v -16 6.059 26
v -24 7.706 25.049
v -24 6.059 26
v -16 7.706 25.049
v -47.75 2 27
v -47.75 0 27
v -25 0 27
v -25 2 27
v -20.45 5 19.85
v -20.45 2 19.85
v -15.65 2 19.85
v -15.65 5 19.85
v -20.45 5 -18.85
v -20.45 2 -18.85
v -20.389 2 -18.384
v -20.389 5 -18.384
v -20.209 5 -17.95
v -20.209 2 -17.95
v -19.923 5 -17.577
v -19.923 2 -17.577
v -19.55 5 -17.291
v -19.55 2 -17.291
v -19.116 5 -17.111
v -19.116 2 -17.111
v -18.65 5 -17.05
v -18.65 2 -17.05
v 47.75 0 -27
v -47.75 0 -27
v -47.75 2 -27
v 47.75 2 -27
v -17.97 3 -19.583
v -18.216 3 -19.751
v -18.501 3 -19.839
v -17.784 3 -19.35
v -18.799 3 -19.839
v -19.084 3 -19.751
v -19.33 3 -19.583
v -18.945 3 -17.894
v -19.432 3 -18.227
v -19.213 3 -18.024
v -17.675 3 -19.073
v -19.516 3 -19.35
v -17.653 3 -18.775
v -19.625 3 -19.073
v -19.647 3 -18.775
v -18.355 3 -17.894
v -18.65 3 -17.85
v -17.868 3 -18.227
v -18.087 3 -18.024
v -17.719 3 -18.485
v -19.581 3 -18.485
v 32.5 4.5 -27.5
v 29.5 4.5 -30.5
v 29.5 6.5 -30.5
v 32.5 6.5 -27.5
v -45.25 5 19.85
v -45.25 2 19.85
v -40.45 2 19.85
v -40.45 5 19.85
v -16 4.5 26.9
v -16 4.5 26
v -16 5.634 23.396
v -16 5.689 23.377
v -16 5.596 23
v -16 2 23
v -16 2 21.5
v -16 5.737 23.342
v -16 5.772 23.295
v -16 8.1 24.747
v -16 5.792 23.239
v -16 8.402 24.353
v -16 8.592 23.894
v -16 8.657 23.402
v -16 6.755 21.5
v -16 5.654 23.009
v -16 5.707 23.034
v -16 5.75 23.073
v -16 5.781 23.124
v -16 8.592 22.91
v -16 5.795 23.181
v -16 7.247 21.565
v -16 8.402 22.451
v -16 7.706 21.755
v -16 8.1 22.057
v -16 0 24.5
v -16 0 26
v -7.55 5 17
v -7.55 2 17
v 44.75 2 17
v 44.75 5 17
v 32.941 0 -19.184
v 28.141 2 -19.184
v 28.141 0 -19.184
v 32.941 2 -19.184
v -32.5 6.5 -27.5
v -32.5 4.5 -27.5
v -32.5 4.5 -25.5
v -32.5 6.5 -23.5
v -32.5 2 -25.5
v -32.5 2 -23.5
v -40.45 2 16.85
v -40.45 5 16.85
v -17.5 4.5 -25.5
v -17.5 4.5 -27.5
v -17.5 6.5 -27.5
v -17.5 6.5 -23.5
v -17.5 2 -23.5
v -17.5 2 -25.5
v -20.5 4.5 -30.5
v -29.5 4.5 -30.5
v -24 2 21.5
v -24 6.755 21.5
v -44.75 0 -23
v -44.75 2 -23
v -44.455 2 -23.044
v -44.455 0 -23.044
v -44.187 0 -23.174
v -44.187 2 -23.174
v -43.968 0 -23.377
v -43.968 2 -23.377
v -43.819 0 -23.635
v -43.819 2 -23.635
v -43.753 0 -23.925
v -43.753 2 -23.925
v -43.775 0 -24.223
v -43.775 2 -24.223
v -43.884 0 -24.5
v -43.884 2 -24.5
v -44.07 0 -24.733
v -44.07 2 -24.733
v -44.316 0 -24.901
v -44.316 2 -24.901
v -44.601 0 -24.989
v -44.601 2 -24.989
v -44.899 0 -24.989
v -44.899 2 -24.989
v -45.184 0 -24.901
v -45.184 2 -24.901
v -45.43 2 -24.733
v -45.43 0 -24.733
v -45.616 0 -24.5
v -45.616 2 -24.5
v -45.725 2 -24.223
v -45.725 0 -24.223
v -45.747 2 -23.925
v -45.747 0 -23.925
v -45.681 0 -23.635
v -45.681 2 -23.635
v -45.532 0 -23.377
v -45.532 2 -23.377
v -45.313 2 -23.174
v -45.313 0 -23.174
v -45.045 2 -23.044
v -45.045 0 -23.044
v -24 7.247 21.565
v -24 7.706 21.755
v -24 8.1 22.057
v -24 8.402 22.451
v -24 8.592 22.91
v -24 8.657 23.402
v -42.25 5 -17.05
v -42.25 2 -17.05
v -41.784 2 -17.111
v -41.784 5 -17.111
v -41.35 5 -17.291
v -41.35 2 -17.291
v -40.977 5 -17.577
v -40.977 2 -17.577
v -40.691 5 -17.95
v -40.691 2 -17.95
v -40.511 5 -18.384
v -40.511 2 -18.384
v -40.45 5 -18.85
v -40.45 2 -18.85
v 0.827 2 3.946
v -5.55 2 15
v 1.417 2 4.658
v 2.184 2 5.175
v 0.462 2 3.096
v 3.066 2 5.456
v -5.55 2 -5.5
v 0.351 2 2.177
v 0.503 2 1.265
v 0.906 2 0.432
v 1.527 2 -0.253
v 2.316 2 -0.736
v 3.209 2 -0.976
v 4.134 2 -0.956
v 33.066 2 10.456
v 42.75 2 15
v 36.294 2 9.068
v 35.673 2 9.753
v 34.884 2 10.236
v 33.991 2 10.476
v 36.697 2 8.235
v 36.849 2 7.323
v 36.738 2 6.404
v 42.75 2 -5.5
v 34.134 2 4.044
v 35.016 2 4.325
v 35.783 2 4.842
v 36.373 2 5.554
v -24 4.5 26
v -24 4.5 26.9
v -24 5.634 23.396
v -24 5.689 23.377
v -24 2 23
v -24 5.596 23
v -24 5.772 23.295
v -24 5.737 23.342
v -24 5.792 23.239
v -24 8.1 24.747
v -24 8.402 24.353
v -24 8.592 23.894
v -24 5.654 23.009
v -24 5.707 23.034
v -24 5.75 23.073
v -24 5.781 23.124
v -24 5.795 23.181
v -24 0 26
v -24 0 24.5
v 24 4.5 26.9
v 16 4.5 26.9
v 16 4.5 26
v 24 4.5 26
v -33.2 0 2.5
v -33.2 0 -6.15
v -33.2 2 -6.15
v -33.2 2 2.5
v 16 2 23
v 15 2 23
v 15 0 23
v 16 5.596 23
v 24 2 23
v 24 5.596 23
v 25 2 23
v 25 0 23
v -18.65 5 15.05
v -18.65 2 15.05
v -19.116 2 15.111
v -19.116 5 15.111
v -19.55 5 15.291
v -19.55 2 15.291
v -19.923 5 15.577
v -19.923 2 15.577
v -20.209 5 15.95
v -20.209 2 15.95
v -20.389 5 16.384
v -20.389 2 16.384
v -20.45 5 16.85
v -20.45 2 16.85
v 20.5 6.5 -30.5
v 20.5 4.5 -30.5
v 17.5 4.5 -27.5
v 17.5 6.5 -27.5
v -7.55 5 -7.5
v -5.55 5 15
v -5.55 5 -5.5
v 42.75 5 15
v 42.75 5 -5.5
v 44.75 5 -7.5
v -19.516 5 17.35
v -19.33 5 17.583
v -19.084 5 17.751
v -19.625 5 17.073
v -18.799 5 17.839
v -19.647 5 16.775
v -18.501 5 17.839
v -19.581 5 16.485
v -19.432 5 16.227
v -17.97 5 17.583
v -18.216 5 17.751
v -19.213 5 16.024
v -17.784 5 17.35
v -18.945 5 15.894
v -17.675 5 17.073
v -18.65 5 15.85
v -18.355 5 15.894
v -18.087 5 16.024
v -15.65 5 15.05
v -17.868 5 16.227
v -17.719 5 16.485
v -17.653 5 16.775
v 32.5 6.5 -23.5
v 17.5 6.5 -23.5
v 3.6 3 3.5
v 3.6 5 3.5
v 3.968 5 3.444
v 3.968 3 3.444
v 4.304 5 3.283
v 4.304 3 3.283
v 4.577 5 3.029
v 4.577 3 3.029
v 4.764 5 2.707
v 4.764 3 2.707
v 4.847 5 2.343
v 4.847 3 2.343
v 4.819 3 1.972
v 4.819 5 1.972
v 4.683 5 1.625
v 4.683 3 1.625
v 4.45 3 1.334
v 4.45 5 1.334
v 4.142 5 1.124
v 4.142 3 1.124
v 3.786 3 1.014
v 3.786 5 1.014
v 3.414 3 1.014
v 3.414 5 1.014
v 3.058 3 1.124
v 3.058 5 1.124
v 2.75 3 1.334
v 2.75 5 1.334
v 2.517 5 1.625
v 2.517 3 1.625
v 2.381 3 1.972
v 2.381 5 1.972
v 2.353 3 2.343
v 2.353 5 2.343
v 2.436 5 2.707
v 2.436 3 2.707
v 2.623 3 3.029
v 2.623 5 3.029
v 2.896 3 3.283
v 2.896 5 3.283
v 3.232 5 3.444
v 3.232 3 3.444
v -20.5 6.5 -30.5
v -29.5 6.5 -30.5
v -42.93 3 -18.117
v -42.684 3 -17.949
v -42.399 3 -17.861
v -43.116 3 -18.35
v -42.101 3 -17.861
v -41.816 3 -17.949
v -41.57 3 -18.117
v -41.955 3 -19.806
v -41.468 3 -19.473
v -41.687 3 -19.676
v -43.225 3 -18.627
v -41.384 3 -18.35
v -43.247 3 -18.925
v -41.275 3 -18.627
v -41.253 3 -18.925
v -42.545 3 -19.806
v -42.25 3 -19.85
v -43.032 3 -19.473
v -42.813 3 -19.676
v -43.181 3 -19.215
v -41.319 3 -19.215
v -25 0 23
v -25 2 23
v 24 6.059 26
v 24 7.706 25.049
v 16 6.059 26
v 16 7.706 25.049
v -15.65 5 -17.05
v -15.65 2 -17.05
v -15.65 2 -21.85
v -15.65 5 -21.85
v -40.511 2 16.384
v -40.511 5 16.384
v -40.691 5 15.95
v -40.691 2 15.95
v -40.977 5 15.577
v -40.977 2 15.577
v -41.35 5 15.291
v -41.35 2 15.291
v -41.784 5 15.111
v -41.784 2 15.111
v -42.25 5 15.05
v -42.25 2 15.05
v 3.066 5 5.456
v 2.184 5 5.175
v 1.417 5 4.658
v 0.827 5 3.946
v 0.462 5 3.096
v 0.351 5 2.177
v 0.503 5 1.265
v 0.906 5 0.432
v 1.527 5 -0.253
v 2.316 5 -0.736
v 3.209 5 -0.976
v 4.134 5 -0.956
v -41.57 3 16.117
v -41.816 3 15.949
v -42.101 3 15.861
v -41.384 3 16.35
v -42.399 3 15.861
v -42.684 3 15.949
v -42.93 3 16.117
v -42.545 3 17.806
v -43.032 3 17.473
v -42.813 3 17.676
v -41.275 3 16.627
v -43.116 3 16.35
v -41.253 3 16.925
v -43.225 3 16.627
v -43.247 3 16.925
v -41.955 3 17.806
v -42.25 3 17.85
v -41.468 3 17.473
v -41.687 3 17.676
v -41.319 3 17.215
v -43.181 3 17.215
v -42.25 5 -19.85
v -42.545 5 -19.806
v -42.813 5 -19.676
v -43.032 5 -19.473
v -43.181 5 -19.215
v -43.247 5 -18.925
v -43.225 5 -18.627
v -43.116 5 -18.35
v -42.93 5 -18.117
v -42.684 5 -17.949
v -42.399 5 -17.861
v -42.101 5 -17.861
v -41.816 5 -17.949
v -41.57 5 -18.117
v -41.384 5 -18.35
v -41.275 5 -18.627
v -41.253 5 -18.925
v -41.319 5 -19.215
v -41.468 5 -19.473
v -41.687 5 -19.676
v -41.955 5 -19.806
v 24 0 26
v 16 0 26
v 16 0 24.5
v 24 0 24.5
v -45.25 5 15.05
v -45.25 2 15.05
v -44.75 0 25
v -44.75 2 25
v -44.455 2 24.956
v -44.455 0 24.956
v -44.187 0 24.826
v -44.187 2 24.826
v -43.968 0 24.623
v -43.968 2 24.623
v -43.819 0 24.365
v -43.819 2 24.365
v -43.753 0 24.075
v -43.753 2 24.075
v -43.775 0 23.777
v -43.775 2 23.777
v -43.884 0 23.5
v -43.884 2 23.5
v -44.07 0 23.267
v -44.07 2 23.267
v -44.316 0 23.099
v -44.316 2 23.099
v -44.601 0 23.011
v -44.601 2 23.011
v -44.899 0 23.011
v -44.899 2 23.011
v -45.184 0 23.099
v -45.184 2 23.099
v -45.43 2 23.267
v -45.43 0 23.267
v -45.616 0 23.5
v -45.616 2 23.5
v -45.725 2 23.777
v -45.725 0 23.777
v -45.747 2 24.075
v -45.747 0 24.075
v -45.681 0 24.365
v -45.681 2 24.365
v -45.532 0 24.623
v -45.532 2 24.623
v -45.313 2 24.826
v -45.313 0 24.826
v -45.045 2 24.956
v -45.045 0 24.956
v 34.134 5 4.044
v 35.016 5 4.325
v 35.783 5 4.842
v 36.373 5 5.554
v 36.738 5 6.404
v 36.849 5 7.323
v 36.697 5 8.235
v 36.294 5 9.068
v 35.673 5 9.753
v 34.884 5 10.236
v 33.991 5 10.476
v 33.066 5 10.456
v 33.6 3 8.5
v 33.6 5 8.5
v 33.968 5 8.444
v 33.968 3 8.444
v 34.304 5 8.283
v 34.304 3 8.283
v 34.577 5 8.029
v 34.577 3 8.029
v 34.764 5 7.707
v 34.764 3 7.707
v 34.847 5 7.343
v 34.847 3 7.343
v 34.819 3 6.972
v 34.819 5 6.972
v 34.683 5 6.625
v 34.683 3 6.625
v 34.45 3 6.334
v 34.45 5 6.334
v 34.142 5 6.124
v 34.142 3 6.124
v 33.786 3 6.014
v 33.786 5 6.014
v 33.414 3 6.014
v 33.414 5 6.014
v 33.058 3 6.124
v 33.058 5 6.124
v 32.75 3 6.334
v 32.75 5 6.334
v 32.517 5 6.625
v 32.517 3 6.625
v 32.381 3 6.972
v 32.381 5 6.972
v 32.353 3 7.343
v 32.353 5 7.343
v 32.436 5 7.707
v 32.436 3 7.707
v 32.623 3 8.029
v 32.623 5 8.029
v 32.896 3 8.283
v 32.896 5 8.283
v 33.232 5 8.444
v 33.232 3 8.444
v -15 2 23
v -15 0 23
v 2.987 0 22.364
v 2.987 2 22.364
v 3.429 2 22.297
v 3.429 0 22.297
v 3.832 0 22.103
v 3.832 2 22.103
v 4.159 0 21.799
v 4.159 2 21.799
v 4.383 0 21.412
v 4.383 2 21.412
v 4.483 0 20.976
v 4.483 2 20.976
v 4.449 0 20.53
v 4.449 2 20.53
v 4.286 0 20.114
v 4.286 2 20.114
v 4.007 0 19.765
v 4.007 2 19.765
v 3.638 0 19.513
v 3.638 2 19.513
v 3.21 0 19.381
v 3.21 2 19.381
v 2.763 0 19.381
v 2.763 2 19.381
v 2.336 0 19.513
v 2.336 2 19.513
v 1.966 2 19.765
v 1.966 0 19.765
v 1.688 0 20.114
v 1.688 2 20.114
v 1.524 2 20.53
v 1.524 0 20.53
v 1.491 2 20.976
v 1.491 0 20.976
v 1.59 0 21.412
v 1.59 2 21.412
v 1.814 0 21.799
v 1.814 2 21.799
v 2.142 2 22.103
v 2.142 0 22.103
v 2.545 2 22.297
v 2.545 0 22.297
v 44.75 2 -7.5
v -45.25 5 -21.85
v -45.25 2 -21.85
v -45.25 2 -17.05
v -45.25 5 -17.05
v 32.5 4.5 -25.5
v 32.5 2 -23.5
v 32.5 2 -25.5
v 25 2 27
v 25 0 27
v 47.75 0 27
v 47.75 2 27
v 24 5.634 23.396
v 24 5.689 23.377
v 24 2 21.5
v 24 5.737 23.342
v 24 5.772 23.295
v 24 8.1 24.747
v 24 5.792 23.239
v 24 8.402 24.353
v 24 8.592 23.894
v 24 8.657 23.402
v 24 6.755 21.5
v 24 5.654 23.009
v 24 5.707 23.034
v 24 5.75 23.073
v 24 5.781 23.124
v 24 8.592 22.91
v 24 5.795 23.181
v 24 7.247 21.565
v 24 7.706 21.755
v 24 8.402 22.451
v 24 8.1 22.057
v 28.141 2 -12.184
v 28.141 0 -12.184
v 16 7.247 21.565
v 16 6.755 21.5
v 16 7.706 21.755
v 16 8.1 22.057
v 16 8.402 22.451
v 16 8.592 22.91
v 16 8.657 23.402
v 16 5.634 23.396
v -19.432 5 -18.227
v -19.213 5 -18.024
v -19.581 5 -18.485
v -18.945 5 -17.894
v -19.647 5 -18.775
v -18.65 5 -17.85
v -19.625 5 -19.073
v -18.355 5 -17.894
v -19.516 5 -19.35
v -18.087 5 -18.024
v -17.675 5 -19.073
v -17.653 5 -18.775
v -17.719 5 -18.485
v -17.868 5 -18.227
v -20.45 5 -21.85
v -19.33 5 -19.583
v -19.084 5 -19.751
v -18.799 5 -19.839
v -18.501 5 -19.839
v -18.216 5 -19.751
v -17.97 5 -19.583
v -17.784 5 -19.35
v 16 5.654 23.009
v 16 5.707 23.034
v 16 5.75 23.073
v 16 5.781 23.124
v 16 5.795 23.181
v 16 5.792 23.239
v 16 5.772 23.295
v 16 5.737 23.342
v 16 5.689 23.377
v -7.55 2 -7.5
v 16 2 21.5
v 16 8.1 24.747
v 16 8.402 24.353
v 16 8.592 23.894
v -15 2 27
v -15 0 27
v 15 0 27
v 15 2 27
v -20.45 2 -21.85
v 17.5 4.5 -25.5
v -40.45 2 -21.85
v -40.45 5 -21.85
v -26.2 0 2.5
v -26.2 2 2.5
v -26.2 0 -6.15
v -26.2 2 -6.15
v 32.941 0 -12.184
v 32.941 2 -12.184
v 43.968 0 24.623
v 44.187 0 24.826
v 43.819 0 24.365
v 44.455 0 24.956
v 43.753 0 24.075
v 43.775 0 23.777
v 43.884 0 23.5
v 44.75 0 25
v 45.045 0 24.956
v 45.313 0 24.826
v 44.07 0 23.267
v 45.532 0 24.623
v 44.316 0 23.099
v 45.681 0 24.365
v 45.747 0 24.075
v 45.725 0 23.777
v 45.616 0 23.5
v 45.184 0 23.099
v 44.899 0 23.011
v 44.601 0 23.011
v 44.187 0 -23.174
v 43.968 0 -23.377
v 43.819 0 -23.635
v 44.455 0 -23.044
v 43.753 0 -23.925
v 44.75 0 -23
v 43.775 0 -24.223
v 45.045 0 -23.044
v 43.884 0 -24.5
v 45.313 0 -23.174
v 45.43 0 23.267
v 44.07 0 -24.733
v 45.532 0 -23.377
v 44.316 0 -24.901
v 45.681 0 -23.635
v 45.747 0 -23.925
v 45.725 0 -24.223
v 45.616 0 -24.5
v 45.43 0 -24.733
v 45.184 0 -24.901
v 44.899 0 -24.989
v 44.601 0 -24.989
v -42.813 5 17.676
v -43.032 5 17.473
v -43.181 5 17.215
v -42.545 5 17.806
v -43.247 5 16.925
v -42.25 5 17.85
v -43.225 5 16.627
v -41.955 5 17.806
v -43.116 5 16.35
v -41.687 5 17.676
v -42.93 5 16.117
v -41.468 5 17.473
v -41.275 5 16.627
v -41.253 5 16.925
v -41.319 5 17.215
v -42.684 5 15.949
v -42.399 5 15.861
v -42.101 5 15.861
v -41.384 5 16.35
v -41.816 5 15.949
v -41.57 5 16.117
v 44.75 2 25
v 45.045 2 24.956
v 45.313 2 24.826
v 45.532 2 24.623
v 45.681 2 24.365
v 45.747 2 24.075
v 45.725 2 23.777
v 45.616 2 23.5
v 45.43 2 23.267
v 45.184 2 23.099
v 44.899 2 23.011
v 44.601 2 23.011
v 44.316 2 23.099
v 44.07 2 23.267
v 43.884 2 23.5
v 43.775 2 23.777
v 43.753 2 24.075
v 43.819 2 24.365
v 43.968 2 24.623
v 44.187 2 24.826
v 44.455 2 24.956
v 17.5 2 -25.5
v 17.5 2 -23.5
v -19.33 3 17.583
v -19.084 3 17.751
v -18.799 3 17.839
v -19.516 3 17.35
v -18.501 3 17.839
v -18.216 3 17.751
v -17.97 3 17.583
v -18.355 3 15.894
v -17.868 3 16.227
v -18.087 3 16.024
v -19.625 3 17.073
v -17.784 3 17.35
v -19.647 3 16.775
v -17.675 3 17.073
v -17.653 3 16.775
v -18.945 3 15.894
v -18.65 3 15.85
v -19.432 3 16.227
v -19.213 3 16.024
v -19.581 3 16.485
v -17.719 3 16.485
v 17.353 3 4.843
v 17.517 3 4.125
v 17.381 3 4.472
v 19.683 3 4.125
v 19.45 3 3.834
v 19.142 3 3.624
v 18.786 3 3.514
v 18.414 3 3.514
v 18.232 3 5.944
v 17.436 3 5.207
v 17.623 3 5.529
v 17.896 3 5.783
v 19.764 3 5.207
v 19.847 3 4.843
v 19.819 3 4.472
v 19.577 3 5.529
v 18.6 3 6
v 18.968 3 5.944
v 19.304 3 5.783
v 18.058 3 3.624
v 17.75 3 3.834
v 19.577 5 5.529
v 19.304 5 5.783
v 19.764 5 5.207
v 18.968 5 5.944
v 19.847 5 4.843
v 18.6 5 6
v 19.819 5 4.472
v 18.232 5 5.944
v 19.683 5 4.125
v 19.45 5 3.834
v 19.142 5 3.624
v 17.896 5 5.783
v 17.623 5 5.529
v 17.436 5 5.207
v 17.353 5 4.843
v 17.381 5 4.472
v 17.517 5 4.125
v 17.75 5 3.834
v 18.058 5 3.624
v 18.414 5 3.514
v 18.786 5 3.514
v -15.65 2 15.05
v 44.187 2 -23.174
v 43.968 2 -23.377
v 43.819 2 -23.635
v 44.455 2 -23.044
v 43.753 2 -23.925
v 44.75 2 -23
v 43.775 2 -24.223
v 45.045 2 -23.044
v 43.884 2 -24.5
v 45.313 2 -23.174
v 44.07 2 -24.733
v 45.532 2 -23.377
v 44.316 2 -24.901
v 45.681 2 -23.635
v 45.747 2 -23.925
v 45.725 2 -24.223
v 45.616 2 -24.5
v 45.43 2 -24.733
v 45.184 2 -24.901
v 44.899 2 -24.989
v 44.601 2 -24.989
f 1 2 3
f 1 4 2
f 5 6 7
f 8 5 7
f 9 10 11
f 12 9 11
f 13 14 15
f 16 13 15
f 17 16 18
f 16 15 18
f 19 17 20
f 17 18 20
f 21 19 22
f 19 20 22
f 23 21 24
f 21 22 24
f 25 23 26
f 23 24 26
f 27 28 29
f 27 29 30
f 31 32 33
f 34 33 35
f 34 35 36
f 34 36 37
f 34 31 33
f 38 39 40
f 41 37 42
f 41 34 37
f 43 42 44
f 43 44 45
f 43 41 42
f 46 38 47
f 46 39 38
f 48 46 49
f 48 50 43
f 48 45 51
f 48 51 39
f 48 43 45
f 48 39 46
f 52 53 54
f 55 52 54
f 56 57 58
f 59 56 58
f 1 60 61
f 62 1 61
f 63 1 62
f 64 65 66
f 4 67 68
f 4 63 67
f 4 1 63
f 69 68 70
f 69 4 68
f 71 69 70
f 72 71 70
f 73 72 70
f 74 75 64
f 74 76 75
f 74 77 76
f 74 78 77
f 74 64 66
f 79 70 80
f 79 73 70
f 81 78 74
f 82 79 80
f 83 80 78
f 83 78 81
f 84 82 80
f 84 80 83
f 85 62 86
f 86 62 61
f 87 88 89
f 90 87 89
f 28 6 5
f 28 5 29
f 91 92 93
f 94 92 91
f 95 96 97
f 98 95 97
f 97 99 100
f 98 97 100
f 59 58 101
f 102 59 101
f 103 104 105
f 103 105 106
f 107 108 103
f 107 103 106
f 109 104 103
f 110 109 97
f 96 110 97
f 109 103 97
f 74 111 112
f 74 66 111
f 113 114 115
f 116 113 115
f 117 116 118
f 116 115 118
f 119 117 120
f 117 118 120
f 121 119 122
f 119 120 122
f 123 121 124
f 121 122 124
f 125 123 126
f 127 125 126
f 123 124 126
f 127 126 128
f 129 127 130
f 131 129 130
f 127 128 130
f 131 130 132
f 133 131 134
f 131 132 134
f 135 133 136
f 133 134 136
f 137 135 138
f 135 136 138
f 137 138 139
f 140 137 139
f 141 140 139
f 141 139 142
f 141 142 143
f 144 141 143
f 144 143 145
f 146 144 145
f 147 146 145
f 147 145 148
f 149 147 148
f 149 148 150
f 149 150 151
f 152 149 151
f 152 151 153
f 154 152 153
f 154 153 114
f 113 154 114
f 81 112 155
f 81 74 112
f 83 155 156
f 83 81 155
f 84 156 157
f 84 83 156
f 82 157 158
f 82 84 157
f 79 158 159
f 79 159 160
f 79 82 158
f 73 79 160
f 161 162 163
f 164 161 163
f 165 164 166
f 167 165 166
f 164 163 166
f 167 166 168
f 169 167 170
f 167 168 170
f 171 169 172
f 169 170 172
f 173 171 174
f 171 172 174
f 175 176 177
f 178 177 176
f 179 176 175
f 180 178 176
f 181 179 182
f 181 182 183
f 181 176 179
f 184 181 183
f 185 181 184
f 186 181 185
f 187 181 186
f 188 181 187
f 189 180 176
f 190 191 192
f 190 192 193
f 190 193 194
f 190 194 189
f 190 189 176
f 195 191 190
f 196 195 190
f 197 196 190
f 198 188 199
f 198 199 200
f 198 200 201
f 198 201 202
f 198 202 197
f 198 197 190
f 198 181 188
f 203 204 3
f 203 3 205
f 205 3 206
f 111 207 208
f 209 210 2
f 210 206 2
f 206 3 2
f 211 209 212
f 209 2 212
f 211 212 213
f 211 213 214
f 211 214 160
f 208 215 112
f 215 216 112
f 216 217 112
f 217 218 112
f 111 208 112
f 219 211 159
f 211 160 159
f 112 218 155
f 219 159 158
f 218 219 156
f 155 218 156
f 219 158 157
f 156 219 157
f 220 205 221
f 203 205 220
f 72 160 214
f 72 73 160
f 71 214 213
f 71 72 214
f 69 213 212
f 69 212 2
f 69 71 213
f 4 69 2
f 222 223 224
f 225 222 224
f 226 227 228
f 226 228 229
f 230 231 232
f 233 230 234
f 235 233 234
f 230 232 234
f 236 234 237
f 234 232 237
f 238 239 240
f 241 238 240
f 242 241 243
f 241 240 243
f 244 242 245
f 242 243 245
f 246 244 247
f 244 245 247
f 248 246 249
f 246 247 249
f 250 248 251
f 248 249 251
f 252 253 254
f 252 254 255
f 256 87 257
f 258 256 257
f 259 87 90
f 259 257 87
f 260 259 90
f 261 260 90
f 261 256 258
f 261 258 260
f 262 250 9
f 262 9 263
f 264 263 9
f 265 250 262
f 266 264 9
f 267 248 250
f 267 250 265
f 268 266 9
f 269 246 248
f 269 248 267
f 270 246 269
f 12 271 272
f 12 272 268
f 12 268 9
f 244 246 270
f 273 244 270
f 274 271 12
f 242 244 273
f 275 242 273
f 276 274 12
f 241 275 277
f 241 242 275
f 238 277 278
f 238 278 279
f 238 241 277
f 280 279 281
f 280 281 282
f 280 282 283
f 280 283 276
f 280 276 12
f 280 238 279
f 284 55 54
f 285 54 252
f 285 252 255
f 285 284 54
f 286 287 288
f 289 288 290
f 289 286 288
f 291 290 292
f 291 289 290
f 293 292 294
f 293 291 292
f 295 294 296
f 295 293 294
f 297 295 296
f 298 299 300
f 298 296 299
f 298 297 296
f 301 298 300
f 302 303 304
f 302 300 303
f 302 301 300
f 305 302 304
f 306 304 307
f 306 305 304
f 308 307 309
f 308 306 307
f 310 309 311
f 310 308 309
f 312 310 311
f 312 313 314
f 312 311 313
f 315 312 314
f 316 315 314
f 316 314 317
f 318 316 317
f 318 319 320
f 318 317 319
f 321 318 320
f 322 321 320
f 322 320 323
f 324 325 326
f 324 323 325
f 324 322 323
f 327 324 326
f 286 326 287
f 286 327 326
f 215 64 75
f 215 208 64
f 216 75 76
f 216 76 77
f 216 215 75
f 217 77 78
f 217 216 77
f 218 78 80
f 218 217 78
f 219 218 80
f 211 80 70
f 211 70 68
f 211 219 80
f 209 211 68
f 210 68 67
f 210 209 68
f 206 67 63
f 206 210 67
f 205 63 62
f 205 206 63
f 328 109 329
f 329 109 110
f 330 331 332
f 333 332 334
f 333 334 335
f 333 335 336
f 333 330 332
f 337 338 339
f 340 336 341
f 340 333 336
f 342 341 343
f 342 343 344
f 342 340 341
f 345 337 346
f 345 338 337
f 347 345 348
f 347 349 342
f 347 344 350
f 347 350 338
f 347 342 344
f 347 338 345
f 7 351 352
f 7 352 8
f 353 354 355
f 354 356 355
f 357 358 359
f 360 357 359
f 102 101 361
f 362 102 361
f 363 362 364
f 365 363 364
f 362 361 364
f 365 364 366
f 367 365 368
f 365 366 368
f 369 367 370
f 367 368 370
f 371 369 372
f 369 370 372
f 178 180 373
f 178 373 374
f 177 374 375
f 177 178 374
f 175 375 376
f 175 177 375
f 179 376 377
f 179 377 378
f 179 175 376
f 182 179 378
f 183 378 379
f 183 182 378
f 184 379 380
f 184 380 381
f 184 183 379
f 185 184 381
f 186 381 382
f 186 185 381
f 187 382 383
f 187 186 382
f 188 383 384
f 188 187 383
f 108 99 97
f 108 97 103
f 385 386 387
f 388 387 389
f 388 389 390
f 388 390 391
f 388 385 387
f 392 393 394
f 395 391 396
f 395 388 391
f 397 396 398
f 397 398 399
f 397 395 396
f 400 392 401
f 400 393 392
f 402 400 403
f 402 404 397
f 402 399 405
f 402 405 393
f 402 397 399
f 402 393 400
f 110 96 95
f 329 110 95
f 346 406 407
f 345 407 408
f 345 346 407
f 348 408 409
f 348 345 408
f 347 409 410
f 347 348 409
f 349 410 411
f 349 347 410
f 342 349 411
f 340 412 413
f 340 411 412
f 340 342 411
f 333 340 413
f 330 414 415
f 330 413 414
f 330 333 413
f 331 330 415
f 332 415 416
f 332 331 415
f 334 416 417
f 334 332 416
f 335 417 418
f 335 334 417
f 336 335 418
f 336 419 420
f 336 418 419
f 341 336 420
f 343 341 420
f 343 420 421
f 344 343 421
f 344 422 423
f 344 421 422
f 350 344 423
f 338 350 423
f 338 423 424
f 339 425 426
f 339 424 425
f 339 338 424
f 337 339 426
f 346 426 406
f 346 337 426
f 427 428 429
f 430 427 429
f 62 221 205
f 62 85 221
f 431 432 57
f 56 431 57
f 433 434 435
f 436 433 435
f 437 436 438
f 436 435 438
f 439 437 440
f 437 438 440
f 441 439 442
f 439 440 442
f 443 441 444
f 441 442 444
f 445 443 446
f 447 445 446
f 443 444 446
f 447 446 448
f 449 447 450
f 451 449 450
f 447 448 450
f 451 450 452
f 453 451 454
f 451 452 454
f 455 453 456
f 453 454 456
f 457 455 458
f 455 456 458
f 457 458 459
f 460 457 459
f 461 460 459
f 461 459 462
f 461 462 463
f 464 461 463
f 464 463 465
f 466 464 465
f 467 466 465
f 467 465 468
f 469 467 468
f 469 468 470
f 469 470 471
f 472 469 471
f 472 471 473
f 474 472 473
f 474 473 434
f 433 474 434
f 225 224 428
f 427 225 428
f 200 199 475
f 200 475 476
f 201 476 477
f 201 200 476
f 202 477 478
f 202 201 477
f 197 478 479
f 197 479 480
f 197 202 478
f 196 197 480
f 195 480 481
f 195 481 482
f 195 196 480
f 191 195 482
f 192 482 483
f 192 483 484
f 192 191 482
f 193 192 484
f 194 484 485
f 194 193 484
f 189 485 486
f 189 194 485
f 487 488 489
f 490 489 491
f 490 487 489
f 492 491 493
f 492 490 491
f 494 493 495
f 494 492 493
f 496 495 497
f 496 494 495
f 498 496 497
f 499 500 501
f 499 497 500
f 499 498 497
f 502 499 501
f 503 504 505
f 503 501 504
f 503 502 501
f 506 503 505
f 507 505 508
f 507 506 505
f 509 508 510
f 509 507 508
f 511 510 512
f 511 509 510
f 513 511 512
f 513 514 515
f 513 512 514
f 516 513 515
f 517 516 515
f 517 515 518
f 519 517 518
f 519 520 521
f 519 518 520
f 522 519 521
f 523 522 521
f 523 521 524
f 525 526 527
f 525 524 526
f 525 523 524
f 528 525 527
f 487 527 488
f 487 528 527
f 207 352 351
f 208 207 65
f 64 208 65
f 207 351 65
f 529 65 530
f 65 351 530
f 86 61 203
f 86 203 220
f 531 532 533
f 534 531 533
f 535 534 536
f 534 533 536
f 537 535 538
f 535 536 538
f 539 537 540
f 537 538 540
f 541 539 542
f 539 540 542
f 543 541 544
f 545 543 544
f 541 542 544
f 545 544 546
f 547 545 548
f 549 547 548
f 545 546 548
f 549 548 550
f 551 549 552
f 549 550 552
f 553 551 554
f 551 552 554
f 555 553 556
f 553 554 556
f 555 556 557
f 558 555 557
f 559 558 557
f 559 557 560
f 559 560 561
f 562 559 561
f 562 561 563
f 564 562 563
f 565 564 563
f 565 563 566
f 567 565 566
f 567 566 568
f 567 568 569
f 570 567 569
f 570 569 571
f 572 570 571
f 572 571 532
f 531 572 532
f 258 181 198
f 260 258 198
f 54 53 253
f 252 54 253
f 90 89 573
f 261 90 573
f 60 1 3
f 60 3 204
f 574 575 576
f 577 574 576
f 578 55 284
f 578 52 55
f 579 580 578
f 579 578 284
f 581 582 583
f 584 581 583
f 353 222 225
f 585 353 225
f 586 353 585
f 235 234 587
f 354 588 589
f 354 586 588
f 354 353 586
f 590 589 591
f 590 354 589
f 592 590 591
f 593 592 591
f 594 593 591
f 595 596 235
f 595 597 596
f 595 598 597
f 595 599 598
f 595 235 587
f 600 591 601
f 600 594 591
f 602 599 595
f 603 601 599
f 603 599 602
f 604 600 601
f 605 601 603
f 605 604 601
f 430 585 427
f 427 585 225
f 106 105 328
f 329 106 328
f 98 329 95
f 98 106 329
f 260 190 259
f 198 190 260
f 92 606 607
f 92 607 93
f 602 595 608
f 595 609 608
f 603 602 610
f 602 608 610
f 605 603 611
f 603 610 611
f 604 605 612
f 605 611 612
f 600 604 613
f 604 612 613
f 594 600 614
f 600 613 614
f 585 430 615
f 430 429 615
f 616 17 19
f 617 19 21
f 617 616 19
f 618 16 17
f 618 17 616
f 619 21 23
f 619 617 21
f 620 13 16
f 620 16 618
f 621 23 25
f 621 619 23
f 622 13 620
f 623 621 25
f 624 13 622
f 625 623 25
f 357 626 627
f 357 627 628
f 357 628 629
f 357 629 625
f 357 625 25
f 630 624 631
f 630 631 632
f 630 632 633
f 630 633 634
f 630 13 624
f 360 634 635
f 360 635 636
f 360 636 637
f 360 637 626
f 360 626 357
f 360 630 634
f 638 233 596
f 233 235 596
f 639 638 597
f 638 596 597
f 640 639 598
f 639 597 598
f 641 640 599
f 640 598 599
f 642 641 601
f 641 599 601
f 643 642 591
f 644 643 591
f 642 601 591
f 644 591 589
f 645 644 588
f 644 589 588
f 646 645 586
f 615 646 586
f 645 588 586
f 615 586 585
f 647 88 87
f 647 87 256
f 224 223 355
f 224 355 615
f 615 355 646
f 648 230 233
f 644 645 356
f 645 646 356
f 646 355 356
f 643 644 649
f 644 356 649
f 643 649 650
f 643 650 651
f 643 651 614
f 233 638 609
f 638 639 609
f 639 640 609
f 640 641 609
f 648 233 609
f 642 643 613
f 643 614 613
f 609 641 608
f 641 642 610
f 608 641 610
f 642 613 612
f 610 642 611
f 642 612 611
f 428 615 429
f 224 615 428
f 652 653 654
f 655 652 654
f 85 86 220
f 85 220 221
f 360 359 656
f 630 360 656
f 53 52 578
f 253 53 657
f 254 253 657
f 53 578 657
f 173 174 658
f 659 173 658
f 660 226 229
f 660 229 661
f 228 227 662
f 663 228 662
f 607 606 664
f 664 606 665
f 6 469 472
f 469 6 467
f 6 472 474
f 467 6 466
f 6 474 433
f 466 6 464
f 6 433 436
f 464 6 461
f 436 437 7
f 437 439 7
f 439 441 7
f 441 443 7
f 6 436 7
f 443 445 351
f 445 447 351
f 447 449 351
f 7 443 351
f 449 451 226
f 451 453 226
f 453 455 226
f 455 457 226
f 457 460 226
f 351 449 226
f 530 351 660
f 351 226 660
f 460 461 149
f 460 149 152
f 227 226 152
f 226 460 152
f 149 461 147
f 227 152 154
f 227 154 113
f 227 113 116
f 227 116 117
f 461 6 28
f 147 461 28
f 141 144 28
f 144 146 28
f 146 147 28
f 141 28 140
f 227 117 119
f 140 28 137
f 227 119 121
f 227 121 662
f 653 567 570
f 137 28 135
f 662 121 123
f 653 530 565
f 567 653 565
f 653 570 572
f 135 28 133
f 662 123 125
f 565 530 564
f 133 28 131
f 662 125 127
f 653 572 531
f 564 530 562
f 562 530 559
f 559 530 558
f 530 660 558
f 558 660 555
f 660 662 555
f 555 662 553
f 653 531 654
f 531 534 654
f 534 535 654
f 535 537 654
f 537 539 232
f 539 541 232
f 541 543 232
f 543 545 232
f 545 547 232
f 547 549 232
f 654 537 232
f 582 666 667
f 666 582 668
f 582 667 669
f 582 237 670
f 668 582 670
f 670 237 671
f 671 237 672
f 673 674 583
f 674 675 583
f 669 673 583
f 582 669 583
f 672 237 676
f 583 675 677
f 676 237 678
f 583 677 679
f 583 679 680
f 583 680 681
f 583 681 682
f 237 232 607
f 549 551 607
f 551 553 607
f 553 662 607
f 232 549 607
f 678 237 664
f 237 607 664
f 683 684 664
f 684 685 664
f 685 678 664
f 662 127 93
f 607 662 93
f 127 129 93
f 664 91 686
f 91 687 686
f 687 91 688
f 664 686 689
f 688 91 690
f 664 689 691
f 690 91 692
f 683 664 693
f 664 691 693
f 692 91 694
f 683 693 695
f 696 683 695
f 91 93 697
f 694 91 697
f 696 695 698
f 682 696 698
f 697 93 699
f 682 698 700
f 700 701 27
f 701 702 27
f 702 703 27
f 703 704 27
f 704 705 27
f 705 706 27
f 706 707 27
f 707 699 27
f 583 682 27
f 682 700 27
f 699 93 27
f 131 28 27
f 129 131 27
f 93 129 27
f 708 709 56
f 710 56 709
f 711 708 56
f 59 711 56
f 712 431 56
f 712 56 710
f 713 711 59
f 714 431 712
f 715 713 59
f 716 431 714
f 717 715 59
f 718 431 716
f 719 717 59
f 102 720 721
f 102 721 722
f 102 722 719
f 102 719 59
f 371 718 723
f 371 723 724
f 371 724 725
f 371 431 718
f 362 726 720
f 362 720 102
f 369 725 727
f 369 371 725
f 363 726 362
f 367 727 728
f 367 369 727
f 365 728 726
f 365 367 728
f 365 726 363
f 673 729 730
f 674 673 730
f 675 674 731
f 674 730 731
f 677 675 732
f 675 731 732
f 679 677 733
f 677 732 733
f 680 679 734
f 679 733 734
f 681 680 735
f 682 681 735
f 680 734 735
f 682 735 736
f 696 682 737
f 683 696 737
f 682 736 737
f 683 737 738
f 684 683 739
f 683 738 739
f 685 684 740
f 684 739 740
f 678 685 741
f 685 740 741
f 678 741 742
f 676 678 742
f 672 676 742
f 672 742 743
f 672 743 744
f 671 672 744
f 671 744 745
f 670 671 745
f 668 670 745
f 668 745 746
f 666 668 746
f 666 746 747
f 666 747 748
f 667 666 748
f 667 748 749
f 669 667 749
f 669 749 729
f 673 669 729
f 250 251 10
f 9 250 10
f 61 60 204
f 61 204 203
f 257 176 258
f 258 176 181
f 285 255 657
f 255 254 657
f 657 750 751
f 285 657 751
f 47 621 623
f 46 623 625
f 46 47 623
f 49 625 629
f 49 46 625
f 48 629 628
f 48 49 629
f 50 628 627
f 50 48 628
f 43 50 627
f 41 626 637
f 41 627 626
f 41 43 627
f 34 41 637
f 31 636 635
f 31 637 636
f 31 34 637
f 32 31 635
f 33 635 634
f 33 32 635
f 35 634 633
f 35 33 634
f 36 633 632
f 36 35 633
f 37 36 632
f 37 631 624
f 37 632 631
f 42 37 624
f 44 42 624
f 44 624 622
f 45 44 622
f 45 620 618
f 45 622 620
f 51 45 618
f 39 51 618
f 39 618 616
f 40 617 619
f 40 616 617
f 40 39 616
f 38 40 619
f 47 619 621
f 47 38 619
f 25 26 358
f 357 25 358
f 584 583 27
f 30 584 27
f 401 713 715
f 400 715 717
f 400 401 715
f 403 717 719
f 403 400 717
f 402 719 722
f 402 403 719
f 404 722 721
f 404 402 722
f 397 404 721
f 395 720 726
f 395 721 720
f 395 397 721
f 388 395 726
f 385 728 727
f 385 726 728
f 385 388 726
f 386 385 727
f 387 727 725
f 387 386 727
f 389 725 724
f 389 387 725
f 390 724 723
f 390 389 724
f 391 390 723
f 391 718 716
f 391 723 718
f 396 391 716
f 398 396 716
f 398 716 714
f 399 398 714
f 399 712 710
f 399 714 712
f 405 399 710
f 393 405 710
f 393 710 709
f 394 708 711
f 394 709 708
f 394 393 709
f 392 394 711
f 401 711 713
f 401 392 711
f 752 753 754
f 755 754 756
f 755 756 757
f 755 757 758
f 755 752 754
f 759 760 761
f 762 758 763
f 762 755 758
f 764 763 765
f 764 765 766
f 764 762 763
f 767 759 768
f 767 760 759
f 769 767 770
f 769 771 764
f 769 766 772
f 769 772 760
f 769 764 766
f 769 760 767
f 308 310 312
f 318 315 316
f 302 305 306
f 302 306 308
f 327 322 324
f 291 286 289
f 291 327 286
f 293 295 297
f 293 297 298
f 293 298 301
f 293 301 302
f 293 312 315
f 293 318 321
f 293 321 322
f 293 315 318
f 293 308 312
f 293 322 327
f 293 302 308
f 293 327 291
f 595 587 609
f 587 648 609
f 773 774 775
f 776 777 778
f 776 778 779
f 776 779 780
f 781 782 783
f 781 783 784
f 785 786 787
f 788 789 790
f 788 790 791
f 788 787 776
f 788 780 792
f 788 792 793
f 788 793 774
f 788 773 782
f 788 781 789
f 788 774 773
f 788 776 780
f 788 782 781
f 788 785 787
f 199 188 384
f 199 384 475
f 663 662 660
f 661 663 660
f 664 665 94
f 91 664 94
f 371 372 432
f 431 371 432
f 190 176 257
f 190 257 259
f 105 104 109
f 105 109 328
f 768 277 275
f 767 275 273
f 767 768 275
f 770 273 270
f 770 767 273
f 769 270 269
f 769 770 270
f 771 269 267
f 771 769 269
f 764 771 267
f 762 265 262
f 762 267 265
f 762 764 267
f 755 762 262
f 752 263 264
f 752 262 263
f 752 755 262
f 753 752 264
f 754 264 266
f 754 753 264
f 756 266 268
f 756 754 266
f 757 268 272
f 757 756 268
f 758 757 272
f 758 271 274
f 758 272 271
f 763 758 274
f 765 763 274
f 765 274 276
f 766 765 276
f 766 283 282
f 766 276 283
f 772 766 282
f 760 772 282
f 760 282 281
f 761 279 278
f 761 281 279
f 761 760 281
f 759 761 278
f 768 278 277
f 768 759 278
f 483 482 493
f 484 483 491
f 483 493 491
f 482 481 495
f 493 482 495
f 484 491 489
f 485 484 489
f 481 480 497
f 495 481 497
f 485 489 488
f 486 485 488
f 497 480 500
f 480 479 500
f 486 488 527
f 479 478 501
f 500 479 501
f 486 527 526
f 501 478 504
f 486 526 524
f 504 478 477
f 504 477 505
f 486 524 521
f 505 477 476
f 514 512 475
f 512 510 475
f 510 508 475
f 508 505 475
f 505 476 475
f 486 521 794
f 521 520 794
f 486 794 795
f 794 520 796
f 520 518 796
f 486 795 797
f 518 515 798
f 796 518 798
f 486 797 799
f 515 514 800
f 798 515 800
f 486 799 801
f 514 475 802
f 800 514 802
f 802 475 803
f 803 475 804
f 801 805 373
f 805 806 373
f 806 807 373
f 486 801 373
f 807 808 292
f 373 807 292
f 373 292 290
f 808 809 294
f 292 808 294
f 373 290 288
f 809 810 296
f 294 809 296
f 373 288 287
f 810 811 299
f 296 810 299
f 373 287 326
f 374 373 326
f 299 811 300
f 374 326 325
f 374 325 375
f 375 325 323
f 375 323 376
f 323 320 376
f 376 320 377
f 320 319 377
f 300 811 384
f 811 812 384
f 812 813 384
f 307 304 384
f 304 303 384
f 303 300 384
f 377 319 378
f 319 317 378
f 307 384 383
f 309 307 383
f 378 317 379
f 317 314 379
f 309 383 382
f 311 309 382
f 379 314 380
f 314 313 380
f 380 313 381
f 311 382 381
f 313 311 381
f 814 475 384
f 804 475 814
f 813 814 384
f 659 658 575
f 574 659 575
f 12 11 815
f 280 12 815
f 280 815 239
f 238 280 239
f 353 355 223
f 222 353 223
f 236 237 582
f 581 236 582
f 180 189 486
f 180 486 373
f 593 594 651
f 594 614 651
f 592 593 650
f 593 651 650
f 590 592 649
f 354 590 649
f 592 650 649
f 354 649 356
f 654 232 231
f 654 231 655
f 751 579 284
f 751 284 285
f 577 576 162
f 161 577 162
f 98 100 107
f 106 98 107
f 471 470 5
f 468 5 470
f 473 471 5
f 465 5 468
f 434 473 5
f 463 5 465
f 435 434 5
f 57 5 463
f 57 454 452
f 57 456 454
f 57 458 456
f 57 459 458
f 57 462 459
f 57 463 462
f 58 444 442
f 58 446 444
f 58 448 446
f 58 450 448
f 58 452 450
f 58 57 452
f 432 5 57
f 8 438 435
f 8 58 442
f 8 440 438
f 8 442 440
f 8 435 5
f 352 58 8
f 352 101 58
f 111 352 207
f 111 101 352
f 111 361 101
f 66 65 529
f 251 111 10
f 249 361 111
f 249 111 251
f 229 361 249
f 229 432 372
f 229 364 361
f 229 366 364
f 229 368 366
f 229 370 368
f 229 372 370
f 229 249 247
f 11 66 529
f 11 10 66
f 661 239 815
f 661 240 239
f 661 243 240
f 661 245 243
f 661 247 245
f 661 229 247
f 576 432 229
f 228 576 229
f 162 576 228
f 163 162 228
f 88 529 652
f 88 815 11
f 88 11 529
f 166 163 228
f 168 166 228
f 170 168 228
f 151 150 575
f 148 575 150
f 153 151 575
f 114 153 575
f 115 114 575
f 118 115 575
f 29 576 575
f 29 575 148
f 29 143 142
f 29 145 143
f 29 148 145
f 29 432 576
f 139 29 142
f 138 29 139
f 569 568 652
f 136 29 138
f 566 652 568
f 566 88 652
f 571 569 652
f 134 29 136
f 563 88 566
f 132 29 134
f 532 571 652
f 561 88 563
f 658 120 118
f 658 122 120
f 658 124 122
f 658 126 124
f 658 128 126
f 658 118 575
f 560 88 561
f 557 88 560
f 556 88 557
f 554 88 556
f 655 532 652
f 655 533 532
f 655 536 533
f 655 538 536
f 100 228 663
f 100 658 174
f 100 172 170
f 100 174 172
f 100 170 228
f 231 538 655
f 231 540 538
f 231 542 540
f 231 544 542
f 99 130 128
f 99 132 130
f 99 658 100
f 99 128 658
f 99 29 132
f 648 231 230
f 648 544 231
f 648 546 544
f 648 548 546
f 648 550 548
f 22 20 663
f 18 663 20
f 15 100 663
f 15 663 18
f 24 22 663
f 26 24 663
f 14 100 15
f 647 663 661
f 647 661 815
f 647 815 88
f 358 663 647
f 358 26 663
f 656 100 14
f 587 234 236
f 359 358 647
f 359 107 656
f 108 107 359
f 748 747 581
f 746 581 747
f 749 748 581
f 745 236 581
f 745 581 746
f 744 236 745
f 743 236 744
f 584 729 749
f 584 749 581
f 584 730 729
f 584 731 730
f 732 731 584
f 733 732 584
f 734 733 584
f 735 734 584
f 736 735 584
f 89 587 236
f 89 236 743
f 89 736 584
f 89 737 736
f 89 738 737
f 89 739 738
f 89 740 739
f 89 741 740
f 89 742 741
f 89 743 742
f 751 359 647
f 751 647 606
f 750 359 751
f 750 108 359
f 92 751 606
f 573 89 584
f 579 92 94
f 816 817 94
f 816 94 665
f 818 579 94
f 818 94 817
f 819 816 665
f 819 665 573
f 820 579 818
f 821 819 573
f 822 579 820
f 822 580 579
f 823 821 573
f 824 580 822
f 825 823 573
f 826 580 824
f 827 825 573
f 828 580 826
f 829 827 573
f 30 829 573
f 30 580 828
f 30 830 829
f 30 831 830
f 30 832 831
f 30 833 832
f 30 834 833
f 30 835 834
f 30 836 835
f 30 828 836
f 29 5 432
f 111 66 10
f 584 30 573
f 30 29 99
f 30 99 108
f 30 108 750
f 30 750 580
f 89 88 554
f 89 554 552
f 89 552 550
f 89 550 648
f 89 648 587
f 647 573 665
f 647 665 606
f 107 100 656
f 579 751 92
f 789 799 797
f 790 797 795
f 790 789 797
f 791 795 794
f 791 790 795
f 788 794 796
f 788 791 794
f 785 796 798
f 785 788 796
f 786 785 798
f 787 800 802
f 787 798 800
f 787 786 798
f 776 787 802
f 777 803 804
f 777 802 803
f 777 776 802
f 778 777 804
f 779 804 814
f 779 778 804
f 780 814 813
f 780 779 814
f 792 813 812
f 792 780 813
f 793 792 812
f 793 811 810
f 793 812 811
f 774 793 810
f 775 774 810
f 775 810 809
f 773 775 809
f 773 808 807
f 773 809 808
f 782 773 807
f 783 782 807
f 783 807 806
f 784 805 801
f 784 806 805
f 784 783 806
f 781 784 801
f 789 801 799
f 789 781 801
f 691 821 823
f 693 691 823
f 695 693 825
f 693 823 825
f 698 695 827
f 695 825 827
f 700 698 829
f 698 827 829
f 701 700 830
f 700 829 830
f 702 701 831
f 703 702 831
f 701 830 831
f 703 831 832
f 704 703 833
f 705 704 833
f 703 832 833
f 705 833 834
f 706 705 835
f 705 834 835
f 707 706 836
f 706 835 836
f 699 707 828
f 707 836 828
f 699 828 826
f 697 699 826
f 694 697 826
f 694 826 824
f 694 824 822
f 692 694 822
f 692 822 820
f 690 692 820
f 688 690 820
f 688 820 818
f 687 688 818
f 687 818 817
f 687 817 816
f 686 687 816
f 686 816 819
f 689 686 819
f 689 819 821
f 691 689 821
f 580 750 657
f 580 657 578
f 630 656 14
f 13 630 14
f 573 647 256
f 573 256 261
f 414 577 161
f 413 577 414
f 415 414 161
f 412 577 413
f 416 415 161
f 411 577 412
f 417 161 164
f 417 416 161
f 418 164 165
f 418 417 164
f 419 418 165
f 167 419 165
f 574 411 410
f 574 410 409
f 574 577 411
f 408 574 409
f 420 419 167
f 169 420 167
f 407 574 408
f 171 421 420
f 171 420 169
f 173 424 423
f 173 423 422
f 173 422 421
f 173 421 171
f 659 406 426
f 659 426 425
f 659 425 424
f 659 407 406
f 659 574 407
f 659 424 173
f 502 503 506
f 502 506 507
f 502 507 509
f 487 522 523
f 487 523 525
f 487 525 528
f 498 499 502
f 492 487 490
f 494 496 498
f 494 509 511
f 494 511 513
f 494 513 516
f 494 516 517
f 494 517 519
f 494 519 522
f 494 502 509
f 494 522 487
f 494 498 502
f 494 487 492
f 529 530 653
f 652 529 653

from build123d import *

# Parameters (mm, degrees)
SKETCH1_W            = 95.5
SKETCH1_H            = 54
BOSS_EXTRUDE1_DEPTH  = 2
SKETCH2_W            = 15
SKETCH2_H            = 2
BOSS_EXTRUDE2_DEPTH  = 2.5
SKETCH3_W            = 15
SKETCH3_H            = 7
BOSS_EXTRUDE3_DEPTH  = 2
CHAMFER1_SIZE        = 3
CUT_EXTRUDE1_REACH   = 59.031
SKETCH4_W            = 10
SKETCH4_H            = 4
BOSS_EXTRUDE4_DEPTH  = 4
FILLET1_R            = 1.901924
FILLET2_R            = 0.2
FILLET1_OF_MIRROR1_R = 1.901924
FILLET2_OF_MIRROR1_R = 0.2
CUT_EXTRUDE5_REACH   = 59.049
SKETCH12_R           = 1.5
SKETCH12_R_2         = 1
CUT_EXTRUDE6_REACH   = 59.049
SKETCH13_W           = 4.8
SKETCH13_H           = 7
CUT_EXTRUDE2_REACH   = 59.317
SKETCH8_W            = 7
SKETCH8_H            = 8.65
BOSS_EXTRUDE5_DEPTH  = 3
CUT_EXTRUDE3_REACH   = 60.049
CUT_EXTRUDE3_START   = 1
SKETCH9_3_R          = 1
SKETCH10_W           = 52.3
SKETCH10_H           = 24.5
SKETCH10_W_2         = 48.3
SKETCH10_H_2         = 20.5
BOSS_EXTRUDE6_DEPTH  = 3
CUT_EXTRUDE4_REACH   = 60.049
CUT_EXTRUDE4_START   = 1
SKETCH10_4_R         = 1.25


with BuildPart() as part:
    # Sketch1 → Boss-Extrude1 (new body)
    with BuildSketch(Plane(origin=(0, 0, 0), x_dir=(1, 0, 0), z_dir=(0, 1, 0))):
        Rectangle(SKETCH1_W, SKETCH1_H)
    extrude(amount=BOSS_EXTRUDE1_DEPTH)

    # Sketch2 → Boss-Extrude2 (add)
    with BuildSketch(Plane.XZ.offset(-2)):
        with Locations((-25, -24.5)):
            Rectangle(SKETCH2_W, SKETCH2_H)
        with Locations((25, -24.5)):
            Rectangle(SKETCH2_W, SKETCH2_H)
    extrude(amount=-BOSS_EXTRUDE2_DEPTH)

    # Sketch3 → Boss-Extrude3 (add)
    with BuildSketch(Plane(origin=(0, 4.5, 0), x_dir=(-1, 0, 0), z_dir=(0, 1, 0))):
        with Locations((-25, -27)):
            Rectangle(SKETCH3_W, SKETCH3_H)
        with Locations((25, -27)):
            Rectangle(SKETCH3_W, SKETCH3_H)
    extrude(amount=BOSS_EXTRUDE3_DEPTH)

    # Chamfer1
    chamfer1_edges = [part.edges().sort_by_distance(p)[0] for p in [
        (32.5, 5.5, -30.5),
        (17.5, 5.5, -30.5),
        (-17.5, 5.5, -30.5),
        (-32.5, 5.5, -30.5),
    ]]
    chamfer(chamfer1_edges, length=CHAMFER1_SIZE)

    # Sketch4 → Cut-Extrude1 (cut, up to next)
    with BuildSketch(Plane.XZ, mode=Mode.PRIVATE) as cut_extrude1_sk1:
        with Locations((-20, 25)):
            Rectangle(SKETCH4_W, SKETCH4_H)
    cut_extrude1_tool1 = extrude(cut_extrude1_sk1.sketch, amount=-CUT_EXTRUDE1_REACH, mode=Mode.PRIVATE) & part.part
    # Sketch4 → Cut-Extrude1 (cut, up to next)
    with BuildSketch(Plane.XZ, mode=Mode.PRIVATE) as cut_extrude1_sk2:
        with Locations((20, 25)):
            Rectangle(SKETCH4_W, SKETCH4_H)
    cut_extrude1_tool2 = extrude(cut_extrude1_sk2.sketch, amount=-CUT_EXTRUDE1_REACH, mode=Mode.PRIVATE) & part.part
    add(cut_extrude1_tool1.solids().sort_by_distance((-20, 0, 25))[0], mode=Mode.SUBTRACT)
    add(cut_extrude1_tool2.solids().sort_by_distance((20, 0, 25))[0], mode=Mode.SUBTRACT)

    # Sketch6 → Boss-Extrude4 (add, symmetric)
    with BuildSketch(Plane(origin=(-20, 0, 0), x_dir=(0, 0, -1), z_dir=(1, 0, 0))):
        Polygon((-21.5, 2), (-21.5, 8.656921938), (-24.5, 8.656921938), (-26, 6.058845727), (-26.9, 4.5), (-26, 4.5), (-26, 0), (-24.5, 0), (-23, 7.656921938), (-23, 2), align=None)
    boss_extrude4 = extrude(amount=BOSS_EXTRUDE4_DEPTH, both=True)

    # Fillet1
    fillet1_edges = [part.edges().sort_by_distance(p)[0] for p in [
        (-20, 8.656921938, 21.5),
        (-20, 8.656921938, 24.5),
    ]]
    fillet(fillet1_edges, radius=FILLET1_R - 0.0001)  # a hair under: the kernel refuses the full size

    # Fillet2
    fillet2_edges = [part.edges().sort_by_distance(p)[0] for p in [
        (-20, 7.656921938, 23),
    ]]
    fillet(fillet2_edges, radius=FILLET2_R)

    # Mirror1: Boss-Extrude4 across plane
    add(boss_extrude4.mirror(Plane(origin=(0, 0, 0), x_dir=(0, 0, 1), z_dir=(1, 0, 0))))

    # Fillet1 of Mirror1
    fillet1_of_mirror1_edges = [part.edges().sort_by_distance(p)[0] for p in [
        (20, 8.656921938, 21.5),
        (20, 8.656921938, 24.5),
    ]]
    fillet(fillet1_of_mirror1_edges, radius=FILLET1_OF_MIRROR1_R - 0.0001)  # a hair under: the kernel refuses the full size

    # Fillet2 of Mirror1
    fillet2_of_mirror1_edges = [part.edges().sort_by_distance(p)[0] for p in [
        (20, 7.656921938, 23),
    ]]
    fillet(fillet2_of_mirror1_edges, radius=FILLET2_OF_MIRROR1_R)

    # Sketch12 → Cut-Extrude5 (cut, up to next)
    with BuildSketch(Plane(origin=(0, 2, 0), x_dir=(1, 0, 0), z_dir=(0, 1, 0)), mode=Mode.PRIVATE) as cut_extrude5_sk1:
        with Locations(Location((2.9867, -20.8641, 0), (0, 0, 270))):
            Circle(SKETCH12_R)
    cut_extrude5_tool1 = extrude(cut_extrude5_sk1.sketch, amount=-CUT_EXTRUDE5_REACH, mode=Mode.PRIVATE) & part.part
    # Sketch12 → Cut-Extrude5 (cut, up to next)
    with BuildSketch(Plane(origin=(0, 2, 0), x_dir=(1, 0, 0), z_dir=(0, 1, 0)), mode=Mode.PRIVATE) as cut_extrude5_sk2:
        with Locations(Location((-44.75, -24, 0), (0, 0, 270))):
            Circle(SKETCH12_R_2)
    cut_extrude5_tool2 = extrude(cut_extrude5_sk2.sketch, amount=-CUT_EXTRUDE5_REACH, mode=Mode.PRIVATE) & part.part
    # Sketch12 → Cut-Extrude5 (cut, up to next)
    with BuildSketch(Plane(origin=(0, 2, 0), x_dir=(1, 0, 0), z_dir=(0, 1, 0)), mode=Mode.PRIVATE) as cut_extrude5_sk3:
        with Locations(Location((44.75, -24, 0), (0, 0, 270))):
            Circle(SKETCH12_R_2)
    cut_extrude5_tool3 = extrude(cut_extrude5_sk3.sketch, amount=-CUT_EXTRUDE5_REACH, mode=Mode.PRIVATE) & part.part
    # Sketch12 → Cut-Extrude5 (cut, up to next)
    with BuildSketch(Plane(origin=(0, 2, 0), x_dir=(1, 0, 0), z_dir=(0, 1, 0)), mode=Mode.PRIVATE) as cut_extrude5_sk4:
        with Locations(Location((-44.75, 24, 0), (0, 0, 270))):
            Circle(SKETCH12_R_2)
    cut_extrude5_tool4 = extrude(cut_extrude5_sk4.sketch, amount=-CUT_EXTRUDE5_REACH, mode=Mode.PRIVATE) & part.part
    # Sketch12 → Cut-Extrude5 (cut, up to next)
    with BuildSketch(Plane(origin=(0, 2, 0), x_dir=(1, 0, 0), z_dir=(0, 1, 0)), mode=Mode.PRIVATE) as cut_extrude5_sk5:
        with Locations(Location((44.75, 24, 0), (0, 0, 270))):
            Circle(SKETCH12_R_2)
    cut_extrude5_tool5 = extrude(cut_extrude5_sk5.sketch, amount=-CUT_EXTRUDE5_REACH, mode=Mode.PRIVATE) & part.part
    add(cut_extrude5_tool1.solids().sort_by_distance((2.9867, 2, 20.8641))[0], mode=Mode.SUBTRACT)
    add(cut_extrude5_tool2.solids().sort_by_distance((-44.75, 2, 24))[0], mode=Mode.SUBTRACT)
    add(cut_extrude5_tool3.solids().sort_by_distance((44.75, 2, 24))[0], mode=Mode.SUBTRACT)
    add(cut_extrude5_tool4.solids().sort_by_distance((-44.75, 2, -24))[0], mode=Mode.SUBTRACT)
    add(cut_extrude5_tool5.solids().sort_by_distance((44.75, 2, -24))[0], mode=Mode.SUBTRACT)

    # Sketch13 → Cut-Extrude6 (cut, up to next)
    with BuildSketch(Plane(origin=(0, 2, 0), x_dir=(1, 0, 0), z_dir=(0, 1, 0)), mode=Mode.PRIVATE) as cut_extrude6_sk1:
        with Locations((30.5407, 15.6841)):
            Rectangle(SKETCH13_W, SKETCH13_H)
    cut_extrude6_tool1 = extrude(cut_extrude6_sk1.sketch, amount=-CUT_EXTRUDE6_REACH, mode=Mode.PRIVATE) & part.part
    add(cut_extrude6_tool1.solids().sort_by_distance((30.5407, 2, -15.6841))[0], mode=Mode.SUBTRACT)

    # Sketch8 → Cut-Extrude2 (cut, up to next)
    with BuildSketch(Plane.XZ, mode=Mode.PRIVATE) as cut_extrude2_sk1:
        with Locations((-29.7, -1.825)):
            Rectangle(SKETCH8_W, SKETCH8_H)
    cut_extrude2_tool1 = extrude(cut_extrude2_sk1.sketch, amount=-CUT_EXTRUDE2_REACH, mode=Mode.PRIVATE) & part.part
    add(cut_extrude2_tool1.solids().sort_by_distance((-29.7, 0, -1.825))[0], mode=Mode.SUBTRACT)

    # Sketch9 → Boss-Extrude5 (add)
    with BuildSketch(Plane(origin=(0, 2, 0), x_dir=(1, 0, 0), z_dir=(0, 1, 0))):
        with BuildLine():
            Line((-45.25, -15.05), (-45.25, -19.85))
            Line((-45.25, -19.85), (-40.45, -19.85))
            Line((-40.45, -19.85), (-40.45, -16.85))
            ThreePointArc((-40.45, -16.85), (-40.977207794, -15.577207794), (-42.25, -15.05))
            Line((-42.25, -15.05), (-45.25, -15.05))
        make_face()
        with BuildLine():
            Line((-15.65, -15.05), (-18.65, -15.05))
            ThreePointArc((-18.65, -15.05), (-19.922792206, -15.577207794), (-20.45, -16.85))
            Line((-20.45, -16.85), (-20.45, -19.85))
            Line((-20.45, -19.85), (-15.65, -19.85))
            Line((-15.65, -19.85), (-15.65, -15.05))
        make_face()
        with BuildLine():
            Line((-45.25, 17.05), (-42.25, 17.05))
            ThreePointArc((-42.25, 17.05), (-40.977207794, 17.577207794), (-40.45, 18.85))
            Line((-40.45, 18.85), (-40.45, 21.85))
            Line((-40.45, 21.85), (-45.25, 21.85))
            Line((-45.25, 21.85), (-45.25, 17.05))
        make_face()
        with BuildLine():
            Line((-15.65, 17.05), (-15.65, 21.85))
            Line((-15.65, 21.85), (-20.45, 21.85))
            Line((-20.45, 21.85), (-20.45, 18.85))
            ThreePointArc((-20.45, 18.85), (-19.922792206, 17.577207794), (-18.65, 17.05))
            Line((-18.65, 17.05), (-15.65, 17.05))
        make_face()
    extrude(amount=BOSS_EXTRUDE5_DEPTH)

    # Sketch9<3> → Cut-Extrude3 (cut, up to next)
    with BuildSketch(Plane(origin=(0, 2, 0), x_dir=(1, 0, 0), z_dir=(0, 1, 0)).offset(CUT_EXTRUDE3_START), mode=Mode.PRIVATE) as cut_extrude3_sk1:
        with Locations(Location((-42.25, -16.85, 0), (0, 0, 270))):
            Circle(SKETCH9_3_R)
    cut_extrude3_tool1 = extrude(cut_extrude3_sk1.sketch, amount=CUT_EXTRUDE3_REACH, mode=Mode.PRIVATE) & part.part
    # Sketch9<3> → Cut-Extrude3 (cut, up to next)
    with BuildSketch(Plane(origin=(0, 2, 0), x_dir=(1, 0, 0), z_dir=(0, 1, 0)).offset(CUT_EXTRUDE3_START), mode=Mode.PRIVATE) as cut_extrude3_sk2:
        with Locations(Location((-18.65, -16.85, 0), (0, 0, 90))):
            Circle(SKETCH9_3_R)
    cut_extrude3_tool2 = extrude(cut_extrude3_sk2.sketch, amount=CUT_EXTRUDE3_REACH, mode=Mode.PRIVATE) & part.part
    # Sketch9<3> → Cut-Extrude3 (cut, up to next)
    with BuildSketch(Plane(origin=(0, 2, 0), x_dir=(1, 0, 0), z_dir=(0, 1, 0)).offset(CUT_EXTRUDE3_START), mode=Mode.PRIVATE) as cut_extrude3_sk3:
        with Locations(Location((-42.25, 18.85, 0), (0, 0, 90))):
            Circle(SKETCH9_3_R)
    cut_extrude3_tool3 = extrude(cut_extrude3_sk3.sketch, amount=CUT_EXTRUDE3_REACH, mode=Mode.PRIVATE) & part.part
    # Sketch9<3> → Cut-Extrude3 (cut, up to next)
    with BuildSketch(Plane(origin=(0, 2, 0), x_dir=(1, 0, 0), z_dir=(0, 1, 0)).offset(CUT_EXTRUDE3_START), mode=Mode.PRIVATE) as cut_extrude3_sk4:
        with Locations(Location((-18.65, 18.85, 0), (0, 0, 270))):
            Circle(SKETCH9_3_R)
    cut_extrude3_tool4 = extrude(cut_extrude3_sk4.sketch, amount=CUT_EXTRUDE3_REACH, mode=Mode.PRIVATE) & part.part
    add(cut_extrude3_tool1.solids().sort_by_distance((-42.25, 3, 16.85))[0], mode=Mode.SUBTRACT)
    add(cut_extrude3_tool2.solids().sort_by_distance((-18.65, 3, 16.85))[0], mode=Mode.SUBTRACT)
    add(cut_extrude3_tool3.solids().sort_by_distance((-42.25, 3, -18.85))[0], mode=Mode.SUBTRACT)
    add(cut_extrude3_tool4.solids().sort_by_distance((-18.65, 3, -18.85))[0], mode=Mode.SUBTRACT)

    # Sketch10 → Boss-Extrude6 (add)
    # profile 1 of 2: a face of its own
    with BuildSketch(Plane(origin=(0, 2, 0), x_dir=(1, 0, 0), z_dir=(0, 1, 0))):
        with Locations((18.6, -4.75)):
            Rectangle(SKETCH10_W, SKETCH10_H)
        with Locations((18.6, -4.75)):
            Rectangle(SKETCH10_W_2, SKETCH10_H_2, mode=Mode.SUBTRACT)
    # profile 2 of 2: a face of its own
    with BuildSketch(Plane(origin=(0, 2, 0), x_dir=(1, 0, 0), z_dir=(0, 1, 0))):
        with BuildLine():
            Line((4.134296709, 0.955780252), (34.134296709, -4.044219748))
            ThreePointArc((34.134296709, -4.044219748), (36.805780252, -7.784296709), (33.065703291, -10.455780252))
            Line((33.065703291, -10.455780252), (3.065703291, -5.455780252))
            ThreePointArc((3.065703291, -5.455780252), (0.394219748, -1.715703291), (4.134296709, 0.955780252))
        make_face()
    extrude(amount=BOSS_EXTRUDE6_DEPTH)

    # Sketch10<4> → Cut-Extrude4 (cut, up to next)
    with BuildSketch(Plane(origin=(0, 2, 0), x_dir=(1, 0, 0), z_dir=(0, 1, 0)).offset(CUT_EXTRUDE4_START), mode=Mode.PRIVATE) as cut_extrude4_sk1:
        with Locations(Location((18.6, -4.75, 0), (0, 0, 270))):
            Circle(SKETCH10_4_R)
    cut_extrude4_tool1 = extrude(cut_extrude4_sk1.sketch, amount=CUT_EXTRUDE4_REACH, mode=Mode.PRIVATE) & part.part
    # Sketch10<4> → Cut-Extrude4 (cut, up to next)
    with BuildSketch(Plane(origin=(0, 2, 0), x_dir=(1, 0, 0), z_dir=(0, 1, 0)).offset(CUT_EXTRUDE4_START), mode=Mode.PRIVATE) as cut_extrude4_sk2:
        with Locations(Location((3.6, -2.25, 0), (0, 0, 270))):
            Circle(SKETCH10_4_R)
    cut_extrude4_tool2 = extrude(cut_extrude4_sk2.sketch, amount=CUT_EXTRUDE4_REACH, mode=Mode.PRIVATE) & part.part
    # Sketch10<4> → Cut-Extrude4 (cut, up to next)
    with BuildSketch(Plane(origin=(0, 2, 0), x_dir=(1, 0, 0), z_dir=(0, 1, 0)).offset(CUT_EXTRUDE4_START), mode=Mode.PRIVATE) as cut_extrude4_sk3:
        with Locations(Location((33.6, -7.25, 0), (0, 0, 270))):
            Circle(SKETCH10_4_R)
    cut_extrude4_tool3 = extrude(cut_extrude4_sk3.sketch, amount=CUT_EXTRUDE4_REACH, mode=Mode.PRIVATE) & part.part
    add(cut_extrude4_tool1.solids().sort_by_distance((18.6, 3, 4.75))[0], mode=Mode.SUBTRACT)
    add(cut_extrude4_tool2.solids().sort_by_distance((3.6, 3, 2.25))[0], mode=Mode.SUBTRACT)
    add(cut_extrude4_tool3.solids().sort_by_distance((33.6, 3, 7.25))[0], mode=Mode.SUBTRACT)


solid = part.part
